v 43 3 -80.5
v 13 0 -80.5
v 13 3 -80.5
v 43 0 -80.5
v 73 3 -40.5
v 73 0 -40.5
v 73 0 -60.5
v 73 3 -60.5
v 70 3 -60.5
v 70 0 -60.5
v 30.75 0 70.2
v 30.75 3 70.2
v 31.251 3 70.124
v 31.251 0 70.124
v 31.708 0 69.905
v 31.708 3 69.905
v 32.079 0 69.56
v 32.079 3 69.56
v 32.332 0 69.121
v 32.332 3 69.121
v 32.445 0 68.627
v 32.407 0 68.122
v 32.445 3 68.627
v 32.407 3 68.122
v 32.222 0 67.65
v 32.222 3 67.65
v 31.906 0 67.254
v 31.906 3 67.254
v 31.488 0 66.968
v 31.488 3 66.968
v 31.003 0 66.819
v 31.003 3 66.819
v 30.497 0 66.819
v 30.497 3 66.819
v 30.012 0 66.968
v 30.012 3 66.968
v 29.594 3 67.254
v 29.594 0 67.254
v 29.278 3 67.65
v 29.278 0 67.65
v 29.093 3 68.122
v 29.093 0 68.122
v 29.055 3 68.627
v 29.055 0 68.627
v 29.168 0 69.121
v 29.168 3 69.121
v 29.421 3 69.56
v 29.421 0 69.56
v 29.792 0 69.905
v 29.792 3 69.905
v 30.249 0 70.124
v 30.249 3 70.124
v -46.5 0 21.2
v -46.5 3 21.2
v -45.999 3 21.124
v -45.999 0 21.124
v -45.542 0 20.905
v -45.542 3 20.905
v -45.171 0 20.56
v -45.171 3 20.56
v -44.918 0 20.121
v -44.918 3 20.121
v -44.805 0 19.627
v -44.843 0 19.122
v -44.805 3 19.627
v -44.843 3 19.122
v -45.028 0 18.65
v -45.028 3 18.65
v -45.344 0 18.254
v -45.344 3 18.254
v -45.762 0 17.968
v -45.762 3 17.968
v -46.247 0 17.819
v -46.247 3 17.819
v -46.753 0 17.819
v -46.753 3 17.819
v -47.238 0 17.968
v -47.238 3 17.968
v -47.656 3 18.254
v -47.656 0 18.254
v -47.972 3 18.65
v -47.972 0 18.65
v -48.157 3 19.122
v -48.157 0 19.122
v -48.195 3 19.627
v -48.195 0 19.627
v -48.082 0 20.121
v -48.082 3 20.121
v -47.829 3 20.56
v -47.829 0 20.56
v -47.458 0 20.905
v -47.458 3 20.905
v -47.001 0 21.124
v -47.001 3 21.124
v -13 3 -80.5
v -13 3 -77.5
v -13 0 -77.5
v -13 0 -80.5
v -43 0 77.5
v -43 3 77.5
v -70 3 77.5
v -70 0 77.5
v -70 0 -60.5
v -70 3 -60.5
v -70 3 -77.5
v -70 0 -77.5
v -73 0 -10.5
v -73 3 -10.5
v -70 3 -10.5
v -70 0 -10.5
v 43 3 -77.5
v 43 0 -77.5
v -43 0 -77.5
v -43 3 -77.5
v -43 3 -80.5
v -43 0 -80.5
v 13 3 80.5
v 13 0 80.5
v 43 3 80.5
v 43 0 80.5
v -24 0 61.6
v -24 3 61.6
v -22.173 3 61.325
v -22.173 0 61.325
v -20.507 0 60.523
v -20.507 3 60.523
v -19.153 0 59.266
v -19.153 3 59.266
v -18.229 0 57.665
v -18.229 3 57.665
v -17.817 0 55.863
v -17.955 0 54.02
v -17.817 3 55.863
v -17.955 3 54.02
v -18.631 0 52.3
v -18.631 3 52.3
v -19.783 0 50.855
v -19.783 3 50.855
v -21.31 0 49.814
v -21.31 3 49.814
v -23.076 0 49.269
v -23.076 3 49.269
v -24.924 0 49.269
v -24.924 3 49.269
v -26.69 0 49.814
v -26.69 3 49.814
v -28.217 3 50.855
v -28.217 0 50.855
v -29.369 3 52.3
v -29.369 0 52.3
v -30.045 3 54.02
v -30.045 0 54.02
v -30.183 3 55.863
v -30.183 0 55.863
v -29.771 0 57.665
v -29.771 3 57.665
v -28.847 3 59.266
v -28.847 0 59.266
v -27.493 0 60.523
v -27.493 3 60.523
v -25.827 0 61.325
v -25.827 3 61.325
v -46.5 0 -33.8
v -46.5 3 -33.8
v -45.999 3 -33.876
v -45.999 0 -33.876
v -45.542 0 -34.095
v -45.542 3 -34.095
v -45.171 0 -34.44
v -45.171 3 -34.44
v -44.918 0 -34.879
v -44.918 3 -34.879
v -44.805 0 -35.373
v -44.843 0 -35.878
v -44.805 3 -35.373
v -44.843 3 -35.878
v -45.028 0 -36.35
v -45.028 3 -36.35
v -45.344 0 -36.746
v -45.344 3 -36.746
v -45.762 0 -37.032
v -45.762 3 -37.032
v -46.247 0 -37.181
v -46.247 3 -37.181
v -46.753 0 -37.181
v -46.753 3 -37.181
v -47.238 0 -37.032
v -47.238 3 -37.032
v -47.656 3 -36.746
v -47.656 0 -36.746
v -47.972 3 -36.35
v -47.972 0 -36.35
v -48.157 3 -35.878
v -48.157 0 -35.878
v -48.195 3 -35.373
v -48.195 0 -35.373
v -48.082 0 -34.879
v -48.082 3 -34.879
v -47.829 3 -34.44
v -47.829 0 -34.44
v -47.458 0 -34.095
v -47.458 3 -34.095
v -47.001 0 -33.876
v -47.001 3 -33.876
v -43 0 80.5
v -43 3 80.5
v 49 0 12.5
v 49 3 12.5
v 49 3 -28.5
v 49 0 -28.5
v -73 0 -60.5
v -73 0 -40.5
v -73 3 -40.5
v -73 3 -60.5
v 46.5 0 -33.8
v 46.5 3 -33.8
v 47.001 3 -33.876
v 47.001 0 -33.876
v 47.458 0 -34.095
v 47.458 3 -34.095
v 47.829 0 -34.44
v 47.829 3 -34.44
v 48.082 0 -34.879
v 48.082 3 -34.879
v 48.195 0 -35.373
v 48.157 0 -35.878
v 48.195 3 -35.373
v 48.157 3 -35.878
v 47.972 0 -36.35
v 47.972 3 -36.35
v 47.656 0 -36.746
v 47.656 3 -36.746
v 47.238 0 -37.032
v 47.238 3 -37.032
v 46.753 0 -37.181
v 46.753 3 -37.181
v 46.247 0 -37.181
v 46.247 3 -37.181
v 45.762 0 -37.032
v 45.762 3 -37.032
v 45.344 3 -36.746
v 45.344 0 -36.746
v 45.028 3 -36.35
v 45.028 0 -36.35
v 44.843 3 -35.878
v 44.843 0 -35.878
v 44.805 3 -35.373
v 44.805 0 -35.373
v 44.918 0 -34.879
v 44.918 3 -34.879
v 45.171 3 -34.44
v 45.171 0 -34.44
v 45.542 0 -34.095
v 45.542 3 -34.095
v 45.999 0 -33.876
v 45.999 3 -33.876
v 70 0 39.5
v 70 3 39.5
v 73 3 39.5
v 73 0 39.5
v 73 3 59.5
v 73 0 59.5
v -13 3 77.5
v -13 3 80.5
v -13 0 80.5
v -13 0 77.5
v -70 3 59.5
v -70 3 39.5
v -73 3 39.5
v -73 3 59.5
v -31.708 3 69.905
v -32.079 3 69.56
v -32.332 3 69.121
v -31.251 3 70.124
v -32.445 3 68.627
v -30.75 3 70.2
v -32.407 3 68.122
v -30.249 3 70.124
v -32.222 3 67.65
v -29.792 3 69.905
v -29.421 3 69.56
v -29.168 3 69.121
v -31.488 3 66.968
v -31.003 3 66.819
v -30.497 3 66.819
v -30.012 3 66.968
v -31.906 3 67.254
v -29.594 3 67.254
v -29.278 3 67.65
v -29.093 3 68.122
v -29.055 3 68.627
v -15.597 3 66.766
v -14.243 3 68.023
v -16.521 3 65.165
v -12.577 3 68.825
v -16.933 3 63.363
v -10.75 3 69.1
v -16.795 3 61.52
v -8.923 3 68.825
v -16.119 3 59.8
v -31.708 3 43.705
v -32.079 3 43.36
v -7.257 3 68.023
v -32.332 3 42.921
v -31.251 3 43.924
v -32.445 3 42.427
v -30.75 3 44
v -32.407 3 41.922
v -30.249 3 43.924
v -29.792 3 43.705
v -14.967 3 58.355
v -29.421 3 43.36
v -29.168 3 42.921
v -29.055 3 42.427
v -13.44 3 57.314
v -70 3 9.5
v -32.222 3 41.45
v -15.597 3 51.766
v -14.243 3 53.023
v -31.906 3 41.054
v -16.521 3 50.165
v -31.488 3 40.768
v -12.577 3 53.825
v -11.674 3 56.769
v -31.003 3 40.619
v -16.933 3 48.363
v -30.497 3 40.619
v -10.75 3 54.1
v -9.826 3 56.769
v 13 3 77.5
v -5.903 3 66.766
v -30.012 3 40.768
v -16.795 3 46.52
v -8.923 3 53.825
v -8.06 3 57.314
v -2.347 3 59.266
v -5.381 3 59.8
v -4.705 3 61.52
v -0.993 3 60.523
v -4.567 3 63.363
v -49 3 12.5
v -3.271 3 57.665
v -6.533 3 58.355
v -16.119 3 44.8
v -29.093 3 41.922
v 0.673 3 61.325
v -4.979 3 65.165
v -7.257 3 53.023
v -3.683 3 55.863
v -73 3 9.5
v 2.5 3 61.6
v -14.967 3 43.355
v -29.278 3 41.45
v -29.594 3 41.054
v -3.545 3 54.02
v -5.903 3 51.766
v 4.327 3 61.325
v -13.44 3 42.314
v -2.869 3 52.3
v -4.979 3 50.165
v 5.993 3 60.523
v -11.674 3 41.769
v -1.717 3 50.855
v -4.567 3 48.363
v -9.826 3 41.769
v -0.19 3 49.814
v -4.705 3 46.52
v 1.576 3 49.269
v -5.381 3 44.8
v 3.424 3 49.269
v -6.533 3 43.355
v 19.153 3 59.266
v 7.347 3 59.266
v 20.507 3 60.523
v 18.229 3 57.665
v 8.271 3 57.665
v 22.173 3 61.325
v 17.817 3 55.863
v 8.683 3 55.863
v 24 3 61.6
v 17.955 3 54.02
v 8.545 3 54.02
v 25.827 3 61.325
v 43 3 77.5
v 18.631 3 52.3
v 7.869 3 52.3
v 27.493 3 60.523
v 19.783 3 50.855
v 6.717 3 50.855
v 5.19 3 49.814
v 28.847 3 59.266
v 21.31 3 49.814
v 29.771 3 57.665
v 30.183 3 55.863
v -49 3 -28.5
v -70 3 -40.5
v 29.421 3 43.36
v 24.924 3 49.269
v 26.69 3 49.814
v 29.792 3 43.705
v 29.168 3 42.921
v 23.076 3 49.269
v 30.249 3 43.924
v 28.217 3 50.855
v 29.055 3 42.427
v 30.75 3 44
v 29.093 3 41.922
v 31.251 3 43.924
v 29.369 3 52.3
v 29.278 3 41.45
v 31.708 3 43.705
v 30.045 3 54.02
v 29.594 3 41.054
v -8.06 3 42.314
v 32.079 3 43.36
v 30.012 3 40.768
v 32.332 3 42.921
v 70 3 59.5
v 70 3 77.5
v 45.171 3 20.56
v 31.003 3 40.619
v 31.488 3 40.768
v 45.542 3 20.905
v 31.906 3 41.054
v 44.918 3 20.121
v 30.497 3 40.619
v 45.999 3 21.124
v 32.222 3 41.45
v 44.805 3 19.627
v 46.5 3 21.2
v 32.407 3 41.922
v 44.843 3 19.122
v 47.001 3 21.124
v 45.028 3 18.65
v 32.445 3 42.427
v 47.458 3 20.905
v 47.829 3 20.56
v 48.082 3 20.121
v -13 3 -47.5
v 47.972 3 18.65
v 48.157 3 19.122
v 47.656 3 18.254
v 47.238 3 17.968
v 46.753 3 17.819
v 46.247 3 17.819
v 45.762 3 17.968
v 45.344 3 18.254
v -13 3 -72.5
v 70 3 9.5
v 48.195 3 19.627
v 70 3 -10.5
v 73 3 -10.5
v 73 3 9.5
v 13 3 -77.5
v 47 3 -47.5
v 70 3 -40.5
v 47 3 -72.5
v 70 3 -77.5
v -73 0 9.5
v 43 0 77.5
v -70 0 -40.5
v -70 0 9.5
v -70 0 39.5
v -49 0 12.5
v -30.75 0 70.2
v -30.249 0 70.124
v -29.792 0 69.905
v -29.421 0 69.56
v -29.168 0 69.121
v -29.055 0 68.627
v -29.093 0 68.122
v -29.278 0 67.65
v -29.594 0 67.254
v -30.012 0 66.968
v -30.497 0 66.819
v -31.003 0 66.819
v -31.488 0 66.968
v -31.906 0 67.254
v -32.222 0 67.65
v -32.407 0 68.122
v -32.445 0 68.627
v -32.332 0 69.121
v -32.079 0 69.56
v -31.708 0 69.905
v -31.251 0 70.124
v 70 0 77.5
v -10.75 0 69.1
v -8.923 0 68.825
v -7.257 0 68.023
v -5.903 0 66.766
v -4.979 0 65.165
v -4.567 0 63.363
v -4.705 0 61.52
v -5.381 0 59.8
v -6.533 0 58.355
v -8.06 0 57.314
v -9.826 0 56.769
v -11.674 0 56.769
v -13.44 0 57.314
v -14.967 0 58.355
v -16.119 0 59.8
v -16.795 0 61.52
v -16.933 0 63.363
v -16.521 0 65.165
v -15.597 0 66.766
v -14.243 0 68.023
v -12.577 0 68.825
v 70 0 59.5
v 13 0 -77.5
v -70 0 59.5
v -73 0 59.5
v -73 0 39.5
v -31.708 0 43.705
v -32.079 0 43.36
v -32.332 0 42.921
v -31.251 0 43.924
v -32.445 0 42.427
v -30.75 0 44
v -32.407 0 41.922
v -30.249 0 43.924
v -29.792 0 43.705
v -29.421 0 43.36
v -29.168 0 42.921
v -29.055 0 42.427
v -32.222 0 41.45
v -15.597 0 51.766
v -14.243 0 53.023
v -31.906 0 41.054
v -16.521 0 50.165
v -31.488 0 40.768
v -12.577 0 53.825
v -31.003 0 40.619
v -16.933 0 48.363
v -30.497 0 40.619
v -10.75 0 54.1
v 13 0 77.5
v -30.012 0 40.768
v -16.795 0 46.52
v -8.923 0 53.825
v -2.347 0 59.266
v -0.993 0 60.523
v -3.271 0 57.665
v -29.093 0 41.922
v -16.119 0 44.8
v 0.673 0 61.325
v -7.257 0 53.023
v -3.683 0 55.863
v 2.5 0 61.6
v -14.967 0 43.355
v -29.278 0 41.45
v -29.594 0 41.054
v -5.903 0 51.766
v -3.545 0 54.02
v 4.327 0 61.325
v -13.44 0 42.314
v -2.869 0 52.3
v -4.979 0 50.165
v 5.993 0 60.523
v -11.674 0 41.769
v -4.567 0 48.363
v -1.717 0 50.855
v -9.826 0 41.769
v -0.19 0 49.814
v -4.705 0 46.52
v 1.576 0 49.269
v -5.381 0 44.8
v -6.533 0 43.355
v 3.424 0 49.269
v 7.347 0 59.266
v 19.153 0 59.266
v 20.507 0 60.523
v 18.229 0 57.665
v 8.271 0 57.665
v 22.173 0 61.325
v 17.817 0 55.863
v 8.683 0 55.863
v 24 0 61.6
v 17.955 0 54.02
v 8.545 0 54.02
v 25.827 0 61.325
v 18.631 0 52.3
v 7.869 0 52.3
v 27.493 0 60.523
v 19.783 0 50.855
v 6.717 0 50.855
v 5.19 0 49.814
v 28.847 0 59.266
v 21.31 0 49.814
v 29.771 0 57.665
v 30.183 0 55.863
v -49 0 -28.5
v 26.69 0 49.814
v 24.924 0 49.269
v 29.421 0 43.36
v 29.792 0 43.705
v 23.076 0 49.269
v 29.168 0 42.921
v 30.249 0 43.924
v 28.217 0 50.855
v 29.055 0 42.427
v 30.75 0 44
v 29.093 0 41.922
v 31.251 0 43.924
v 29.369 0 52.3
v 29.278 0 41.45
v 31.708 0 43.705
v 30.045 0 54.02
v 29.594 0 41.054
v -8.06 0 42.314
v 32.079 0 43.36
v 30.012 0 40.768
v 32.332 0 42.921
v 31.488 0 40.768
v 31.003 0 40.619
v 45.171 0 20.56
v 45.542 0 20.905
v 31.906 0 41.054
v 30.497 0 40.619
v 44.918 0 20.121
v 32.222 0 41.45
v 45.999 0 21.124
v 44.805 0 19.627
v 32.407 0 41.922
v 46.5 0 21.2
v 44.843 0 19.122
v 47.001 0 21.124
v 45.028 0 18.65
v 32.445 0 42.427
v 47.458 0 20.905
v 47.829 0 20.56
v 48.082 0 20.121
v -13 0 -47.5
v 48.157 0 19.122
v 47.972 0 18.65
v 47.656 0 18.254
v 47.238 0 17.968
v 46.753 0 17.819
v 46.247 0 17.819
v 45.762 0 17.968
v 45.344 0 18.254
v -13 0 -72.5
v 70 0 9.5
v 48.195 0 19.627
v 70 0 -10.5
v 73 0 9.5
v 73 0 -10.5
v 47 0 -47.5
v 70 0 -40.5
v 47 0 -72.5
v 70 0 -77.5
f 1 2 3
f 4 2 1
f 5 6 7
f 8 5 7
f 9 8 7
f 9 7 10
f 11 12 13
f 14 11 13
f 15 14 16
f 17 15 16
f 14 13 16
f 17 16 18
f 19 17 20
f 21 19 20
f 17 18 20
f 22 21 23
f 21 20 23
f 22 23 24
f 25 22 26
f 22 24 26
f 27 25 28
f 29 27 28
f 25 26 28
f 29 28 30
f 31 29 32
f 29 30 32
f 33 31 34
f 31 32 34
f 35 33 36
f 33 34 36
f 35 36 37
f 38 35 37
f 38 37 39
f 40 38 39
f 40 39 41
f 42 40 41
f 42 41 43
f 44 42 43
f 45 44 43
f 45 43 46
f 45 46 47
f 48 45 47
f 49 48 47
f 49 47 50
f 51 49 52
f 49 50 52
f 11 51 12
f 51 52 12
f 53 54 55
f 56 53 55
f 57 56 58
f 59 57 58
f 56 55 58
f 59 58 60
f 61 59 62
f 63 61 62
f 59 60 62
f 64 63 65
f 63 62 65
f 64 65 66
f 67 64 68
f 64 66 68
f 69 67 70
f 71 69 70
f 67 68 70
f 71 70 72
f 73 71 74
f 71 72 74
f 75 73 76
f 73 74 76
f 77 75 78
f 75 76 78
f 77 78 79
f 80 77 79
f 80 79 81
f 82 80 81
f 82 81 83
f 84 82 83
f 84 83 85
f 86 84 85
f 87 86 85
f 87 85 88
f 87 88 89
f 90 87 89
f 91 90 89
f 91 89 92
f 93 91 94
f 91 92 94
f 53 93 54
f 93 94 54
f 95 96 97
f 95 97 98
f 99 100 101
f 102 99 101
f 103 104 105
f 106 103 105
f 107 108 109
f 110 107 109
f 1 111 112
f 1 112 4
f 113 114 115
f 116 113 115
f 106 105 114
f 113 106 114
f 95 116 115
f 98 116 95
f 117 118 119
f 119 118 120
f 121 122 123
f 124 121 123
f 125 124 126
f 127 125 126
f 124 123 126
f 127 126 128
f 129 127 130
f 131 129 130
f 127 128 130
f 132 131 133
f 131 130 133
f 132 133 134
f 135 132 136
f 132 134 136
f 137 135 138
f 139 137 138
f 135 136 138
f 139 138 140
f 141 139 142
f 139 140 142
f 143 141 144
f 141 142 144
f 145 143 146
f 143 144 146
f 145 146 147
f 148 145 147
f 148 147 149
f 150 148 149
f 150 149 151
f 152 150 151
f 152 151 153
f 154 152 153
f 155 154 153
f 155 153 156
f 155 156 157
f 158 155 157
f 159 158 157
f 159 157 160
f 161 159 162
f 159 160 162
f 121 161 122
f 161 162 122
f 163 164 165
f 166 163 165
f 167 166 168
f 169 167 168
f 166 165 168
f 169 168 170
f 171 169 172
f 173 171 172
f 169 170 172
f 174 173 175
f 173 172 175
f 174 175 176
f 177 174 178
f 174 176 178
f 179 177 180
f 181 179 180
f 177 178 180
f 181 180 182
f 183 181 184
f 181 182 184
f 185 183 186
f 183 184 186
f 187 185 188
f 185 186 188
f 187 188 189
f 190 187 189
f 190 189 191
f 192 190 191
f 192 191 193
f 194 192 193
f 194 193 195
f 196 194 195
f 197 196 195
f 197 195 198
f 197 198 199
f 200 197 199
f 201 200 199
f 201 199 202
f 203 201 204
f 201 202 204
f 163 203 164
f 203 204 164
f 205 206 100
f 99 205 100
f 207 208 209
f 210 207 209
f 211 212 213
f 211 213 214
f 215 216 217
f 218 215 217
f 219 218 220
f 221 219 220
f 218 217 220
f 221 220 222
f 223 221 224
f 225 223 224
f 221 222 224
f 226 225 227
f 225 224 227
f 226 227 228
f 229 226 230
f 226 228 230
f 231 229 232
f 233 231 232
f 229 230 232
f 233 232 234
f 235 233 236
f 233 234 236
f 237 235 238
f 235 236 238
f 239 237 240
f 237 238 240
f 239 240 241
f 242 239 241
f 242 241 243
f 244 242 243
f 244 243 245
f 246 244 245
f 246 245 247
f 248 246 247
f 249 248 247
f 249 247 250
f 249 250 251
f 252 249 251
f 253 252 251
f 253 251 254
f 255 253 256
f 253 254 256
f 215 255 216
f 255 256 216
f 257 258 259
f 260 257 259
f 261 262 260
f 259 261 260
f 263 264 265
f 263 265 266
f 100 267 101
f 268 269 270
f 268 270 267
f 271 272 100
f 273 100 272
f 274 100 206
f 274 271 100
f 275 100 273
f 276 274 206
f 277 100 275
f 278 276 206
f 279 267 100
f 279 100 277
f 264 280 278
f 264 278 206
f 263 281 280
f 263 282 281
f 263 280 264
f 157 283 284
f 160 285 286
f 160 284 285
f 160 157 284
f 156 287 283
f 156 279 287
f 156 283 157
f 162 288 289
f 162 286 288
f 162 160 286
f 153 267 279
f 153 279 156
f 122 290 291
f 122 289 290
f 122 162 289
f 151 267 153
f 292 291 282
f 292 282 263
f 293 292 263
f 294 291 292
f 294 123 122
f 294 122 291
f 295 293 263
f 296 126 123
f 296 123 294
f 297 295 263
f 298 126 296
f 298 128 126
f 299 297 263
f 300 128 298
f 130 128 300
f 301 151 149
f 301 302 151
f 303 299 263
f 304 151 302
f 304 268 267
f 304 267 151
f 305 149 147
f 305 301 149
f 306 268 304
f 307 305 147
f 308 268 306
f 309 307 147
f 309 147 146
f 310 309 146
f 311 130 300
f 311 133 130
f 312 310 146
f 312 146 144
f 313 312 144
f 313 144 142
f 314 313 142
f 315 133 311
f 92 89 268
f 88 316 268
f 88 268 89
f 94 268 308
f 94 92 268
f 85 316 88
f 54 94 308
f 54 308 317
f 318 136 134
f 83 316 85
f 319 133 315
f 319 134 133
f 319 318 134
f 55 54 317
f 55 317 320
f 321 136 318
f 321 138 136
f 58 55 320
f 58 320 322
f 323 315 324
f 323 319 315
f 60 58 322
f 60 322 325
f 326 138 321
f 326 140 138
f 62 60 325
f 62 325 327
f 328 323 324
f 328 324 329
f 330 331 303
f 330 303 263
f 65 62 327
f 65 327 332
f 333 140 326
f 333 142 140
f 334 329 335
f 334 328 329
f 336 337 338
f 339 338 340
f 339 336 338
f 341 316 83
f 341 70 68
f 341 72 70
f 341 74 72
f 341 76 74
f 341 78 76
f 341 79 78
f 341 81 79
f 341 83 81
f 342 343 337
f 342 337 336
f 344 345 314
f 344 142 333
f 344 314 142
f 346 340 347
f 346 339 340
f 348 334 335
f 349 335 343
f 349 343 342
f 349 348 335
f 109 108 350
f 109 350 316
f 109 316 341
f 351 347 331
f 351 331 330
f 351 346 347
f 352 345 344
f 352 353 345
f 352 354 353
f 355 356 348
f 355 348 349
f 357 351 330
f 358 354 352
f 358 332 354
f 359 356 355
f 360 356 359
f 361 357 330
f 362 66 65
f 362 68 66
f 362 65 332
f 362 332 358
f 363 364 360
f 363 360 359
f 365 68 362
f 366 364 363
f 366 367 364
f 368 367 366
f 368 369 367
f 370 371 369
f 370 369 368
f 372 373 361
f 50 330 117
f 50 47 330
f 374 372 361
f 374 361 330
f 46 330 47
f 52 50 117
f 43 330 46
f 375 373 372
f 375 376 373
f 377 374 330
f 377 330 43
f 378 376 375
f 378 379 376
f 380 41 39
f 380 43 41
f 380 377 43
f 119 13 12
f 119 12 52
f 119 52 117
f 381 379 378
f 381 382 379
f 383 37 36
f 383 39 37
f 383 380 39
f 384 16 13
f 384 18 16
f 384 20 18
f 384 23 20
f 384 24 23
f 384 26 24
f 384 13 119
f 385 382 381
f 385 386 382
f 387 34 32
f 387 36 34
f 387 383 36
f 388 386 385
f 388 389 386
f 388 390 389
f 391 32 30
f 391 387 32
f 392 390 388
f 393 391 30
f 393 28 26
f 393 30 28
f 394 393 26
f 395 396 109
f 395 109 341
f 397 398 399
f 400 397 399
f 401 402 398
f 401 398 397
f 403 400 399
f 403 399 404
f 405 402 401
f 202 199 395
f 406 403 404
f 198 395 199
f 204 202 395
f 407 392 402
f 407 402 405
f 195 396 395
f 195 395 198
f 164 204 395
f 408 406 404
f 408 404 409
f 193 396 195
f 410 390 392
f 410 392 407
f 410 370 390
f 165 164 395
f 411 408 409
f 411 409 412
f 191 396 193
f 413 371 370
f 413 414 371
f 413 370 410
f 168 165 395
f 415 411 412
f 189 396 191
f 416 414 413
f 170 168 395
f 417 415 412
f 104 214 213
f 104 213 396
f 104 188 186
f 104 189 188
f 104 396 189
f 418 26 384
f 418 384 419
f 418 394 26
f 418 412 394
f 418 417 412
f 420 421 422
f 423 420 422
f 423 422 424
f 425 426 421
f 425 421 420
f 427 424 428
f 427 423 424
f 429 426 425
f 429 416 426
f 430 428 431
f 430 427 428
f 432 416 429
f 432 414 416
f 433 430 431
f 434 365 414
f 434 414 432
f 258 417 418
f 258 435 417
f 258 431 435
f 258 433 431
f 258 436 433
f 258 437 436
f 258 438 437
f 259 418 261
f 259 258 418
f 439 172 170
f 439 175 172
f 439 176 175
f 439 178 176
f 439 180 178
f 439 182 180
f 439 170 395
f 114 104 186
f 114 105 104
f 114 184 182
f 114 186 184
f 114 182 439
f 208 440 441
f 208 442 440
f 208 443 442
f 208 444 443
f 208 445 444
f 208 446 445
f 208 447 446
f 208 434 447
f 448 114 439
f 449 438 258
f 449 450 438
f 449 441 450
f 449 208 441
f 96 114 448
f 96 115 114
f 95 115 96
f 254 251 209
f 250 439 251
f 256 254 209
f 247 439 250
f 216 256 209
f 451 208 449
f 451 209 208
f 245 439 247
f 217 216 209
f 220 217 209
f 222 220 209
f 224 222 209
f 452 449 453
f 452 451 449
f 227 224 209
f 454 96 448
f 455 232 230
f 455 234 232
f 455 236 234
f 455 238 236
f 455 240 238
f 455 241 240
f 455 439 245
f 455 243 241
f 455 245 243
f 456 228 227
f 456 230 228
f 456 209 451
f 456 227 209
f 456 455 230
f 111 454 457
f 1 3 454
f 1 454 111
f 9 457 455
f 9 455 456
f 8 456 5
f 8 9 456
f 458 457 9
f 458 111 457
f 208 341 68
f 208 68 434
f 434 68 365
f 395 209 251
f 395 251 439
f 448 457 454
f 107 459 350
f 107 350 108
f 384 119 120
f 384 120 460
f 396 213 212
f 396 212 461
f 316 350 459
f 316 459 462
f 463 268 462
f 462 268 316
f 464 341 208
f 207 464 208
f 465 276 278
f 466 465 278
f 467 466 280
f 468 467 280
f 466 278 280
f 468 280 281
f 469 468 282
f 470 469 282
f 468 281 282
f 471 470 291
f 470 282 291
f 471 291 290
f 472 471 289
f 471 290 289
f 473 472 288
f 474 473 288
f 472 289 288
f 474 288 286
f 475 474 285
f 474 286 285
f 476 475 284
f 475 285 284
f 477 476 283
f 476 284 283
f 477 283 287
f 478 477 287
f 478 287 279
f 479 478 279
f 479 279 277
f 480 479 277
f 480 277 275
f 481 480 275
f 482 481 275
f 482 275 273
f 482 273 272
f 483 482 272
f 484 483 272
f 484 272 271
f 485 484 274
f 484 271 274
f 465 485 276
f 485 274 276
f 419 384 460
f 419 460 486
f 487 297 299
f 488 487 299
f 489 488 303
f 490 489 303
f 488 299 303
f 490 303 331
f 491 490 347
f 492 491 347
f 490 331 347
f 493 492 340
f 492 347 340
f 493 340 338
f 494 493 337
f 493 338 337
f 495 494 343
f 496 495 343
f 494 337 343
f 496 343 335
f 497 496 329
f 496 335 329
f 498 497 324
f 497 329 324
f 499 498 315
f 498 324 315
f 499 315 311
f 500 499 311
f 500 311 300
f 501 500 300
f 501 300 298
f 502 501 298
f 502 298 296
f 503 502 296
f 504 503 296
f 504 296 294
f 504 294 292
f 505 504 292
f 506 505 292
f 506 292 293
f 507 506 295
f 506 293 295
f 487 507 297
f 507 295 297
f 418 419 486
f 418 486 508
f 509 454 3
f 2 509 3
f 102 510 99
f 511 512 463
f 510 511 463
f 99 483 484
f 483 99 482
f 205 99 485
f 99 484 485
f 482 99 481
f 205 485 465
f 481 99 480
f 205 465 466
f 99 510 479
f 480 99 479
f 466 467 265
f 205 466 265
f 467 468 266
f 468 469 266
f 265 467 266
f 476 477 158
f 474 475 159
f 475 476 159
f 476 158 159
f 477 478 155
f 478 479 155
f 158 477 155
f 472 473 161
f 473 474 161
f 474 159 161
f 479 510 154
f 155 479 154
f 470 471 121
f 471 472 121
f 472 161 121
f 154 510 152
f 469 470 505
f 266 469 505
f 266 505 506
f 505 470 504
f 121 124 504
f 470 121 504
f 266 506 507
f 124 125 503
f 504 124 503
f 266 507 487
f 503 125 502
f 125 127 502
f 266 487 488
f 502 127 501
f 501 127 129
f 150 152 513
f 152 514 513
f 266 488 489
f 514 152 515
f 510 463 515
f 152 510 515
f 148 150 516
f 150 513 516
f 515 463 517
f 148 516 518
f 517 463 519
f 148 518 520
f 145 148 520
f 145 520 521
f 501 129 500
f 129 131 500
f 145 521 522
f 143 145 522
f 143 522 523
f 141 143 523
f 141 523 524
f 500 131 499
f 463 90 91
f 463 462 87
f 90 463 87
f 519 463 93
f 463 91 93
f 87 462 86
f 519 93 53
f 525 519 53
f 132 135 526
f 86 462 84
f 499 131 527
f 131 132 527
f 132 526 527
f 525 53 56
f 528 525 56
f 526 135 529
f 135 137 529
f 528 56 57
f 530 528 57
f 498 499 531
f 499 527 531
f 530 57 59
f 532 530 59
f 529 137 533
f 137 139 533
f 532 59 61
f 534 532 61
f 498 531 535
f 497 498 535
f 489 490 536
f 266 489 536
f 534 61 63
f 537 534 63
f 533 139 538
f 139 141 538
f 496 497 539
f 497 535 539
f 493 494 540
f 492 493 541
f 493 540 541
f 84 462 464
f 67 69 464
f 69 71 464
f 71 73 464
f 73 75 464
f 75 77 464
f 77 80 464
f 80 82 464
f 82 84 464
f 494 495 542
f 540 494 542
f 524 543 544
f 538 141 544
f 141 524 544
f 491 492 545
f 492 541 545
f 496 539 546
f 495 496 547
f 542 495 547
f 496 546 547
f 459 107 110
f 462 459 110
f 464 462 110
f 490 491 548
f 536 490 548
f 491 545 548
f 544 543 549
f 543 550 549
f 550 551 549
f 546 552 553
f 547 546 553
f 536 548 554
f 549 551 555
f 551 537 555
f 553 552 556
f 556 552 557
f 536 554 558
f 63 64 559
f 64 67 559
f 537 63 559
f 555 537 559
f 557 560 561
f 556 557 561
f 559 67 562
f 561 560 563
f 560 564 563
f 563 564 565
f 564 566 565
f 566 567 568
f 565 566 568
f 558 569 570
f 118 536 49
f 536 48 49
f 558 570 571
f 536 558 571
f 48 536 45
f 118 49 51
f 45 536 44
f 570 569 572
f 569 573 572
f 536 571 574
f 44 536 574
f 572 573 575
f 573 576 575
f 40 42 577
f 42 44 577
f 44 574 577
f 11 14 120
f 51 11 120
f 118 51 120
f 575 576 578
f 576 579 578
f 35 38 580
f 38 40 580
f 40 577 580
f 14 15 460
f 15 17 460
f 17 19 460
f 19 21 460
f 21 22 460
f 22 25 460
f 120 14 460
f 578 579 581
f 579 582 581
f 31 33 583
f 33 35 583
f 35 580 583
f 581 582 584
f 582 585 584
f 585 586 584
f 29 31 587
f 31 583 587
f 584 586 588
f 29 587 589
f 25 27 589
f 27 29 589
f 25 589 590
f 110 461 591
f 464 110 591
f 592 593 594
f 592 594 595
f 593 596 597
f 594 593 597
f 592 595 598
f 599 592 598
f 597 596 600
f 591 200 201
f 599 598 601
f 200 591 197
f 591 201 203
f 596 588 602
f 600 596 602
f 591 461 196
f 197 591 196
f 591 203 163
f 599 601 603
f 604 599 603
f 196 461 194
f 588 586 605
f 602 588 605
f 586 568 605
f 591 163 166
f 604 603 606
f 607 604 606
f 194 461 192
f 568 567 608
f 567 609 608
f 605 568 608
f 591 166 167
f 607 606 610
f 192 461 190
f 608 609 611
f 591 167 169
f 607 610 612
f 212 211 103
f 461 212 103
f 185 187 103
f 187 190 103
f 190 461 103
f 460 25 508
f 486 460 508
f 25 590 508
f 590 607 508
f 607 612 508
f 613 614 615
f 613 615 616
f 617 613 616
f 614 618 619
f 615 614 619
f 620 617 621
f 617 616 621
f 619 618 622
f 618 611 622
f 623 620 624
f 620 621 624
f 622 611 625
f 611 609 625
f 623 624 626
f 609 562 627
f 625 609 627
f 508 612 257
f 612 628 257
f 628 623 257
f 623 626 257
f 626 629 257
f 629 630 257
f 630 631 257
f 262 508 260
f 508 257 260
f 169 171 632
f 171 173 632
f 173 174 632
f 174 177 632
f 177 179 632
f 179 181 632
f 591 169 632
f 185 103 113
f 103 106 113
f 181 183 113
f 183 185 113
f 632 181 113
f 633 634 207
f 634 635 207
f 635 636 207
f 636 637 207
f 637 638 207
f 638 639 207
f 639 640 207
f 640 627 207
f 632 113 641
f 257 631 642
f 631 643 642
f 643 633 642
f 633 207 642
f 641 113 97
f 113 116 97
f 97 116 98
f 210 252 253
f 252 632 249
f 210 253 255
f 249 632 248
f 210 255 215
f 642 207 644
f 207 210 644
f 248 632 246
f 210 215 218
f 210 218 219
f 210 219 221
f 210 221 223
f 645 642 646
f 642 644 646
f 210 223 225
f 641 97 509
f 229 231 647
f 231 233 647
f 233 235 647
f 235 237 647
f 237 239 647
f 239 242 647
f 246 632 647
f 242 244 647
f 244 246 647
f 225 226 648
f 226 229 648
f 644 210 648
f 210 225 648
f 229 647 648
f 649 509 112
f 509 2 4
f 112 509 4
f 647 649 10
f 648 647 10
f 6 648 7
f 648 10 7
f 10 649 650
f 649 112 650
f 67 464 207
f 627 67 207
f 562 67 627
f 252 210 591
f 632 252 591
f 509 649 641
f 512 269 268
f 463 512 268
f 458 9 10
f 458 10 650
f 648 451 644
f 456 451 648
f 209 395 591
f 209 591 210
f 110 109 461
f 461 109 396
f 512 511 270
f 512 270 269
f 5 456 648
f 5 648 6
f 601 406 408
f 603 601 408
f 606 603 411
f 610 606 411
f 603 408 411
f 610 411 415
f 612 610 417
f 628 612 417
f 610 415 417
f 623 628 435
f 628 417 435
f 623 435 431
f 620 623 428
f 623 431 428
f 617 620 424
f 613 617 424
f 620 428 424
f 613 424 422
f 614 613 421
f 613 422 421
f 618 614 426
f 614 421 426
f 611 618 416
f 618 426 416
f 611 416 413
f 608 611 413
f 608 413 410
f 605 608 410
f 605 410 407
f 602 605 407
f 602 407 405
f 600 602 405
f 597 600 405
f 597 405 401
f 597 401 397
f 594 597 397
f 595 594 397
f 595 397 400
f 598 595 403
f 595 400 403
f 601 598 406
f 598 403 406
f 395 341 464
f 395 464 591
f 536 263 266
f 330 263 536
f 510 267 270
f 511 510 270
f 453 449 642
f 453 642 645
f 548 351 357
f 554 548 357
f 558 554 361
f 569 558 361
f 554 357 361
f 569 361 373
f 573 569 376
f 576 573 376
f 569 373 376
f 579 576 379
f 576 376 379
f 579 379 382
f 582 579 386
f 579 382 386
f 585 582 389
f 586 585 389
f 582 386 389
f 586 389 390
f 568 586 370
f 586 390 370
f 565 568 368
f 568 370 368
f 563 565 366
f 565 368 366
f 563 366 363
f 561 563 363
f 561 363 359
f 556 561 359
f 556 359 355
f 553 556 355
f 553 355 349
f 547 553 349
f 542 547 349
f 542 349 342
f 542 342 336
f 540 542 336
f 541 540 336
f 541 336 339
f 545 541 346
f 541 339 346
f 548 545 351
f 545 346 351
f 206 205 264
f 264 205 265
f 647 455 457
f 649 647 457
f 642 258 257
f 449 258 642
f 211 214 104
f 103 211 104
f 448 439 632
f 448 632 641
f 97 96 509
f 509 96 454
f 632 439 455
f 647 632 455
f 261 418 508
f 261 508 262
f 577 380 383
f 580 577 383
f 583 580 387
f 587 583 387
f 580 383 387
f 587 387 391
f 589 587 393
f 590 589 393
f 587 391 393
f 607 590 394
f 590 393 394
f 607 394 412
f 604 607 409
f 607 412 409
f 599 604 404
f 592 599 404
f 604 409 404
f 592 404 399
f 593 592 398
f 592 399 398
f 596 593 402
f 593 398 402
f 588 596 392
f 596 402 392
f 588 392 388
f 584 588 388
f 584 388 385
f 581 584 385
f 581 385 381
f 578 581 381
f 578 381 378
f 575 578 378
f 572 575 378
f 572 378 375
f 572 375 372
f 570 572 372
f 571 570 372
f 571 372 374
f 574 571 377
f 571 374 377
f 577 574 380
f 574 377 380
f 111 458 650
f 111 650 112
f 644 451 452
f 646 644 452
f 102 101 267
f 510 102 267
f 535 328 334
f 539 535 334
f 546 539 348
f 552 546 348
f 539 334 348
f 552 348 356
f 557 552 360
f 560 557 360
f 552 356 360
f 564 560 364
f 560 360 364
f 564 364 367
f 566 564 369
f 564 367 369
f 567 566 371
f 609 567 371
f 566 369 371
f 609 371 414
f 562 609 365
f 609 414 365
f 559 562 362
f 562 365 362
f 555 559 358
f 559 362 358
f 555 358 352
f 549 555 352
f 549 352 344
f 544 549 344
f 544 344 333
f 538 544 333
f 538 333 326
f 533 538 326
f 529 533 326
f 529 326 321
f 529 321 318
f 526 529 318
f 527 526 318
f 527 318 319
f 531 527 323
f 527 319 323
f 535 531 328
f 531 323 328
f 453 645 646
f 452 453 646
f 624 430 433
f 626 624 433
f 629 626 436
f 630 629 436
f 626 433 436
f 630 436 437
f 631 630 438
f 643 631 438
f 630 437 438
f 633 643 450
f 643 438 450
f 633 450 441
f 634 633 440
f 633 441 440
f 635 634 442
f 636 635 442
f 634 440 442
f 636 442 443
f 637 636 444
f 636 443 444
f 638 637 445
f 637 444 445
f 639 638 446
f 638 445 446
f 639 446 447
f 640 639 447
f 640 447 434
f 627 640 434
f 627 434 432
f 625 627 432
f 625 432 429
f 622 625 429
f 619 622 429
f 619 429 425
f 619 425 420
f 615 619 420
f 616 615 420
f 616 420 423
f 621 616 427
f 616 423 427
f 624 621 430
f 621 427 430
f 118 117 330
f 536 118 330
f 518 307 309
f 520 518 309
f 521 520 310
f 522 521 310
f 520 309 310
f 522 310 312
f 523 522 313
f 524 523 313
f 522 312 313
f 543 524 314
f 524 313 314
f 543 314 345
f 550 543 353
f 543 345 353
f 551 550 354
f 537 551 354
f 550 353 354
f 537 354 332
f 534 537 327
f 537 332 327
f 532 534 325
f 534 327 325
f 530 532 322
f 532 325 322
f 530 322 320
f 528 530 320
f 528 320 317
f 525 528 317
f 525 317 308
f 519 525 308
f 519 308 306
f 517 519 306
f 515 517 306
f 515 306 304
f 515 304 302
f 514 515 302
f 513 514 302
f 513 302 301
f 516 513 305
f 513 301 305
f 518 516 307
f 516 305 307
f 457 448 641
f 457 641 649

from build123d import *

# Parameters (mm, degrees)
SKETCH1_W           = 146
SKETCH1_H           = 161
BOSS_EXTRUDE1_DEPTH = 3
SKETCH2_W           = 26
SKETCH2_H           = 3
SKETCH2_W_2         = 3
SKETCH2_H_2         = 30
SKETCH2_W_3         = 60
SKETCH2_H_3         = 25
CUT_EXTRUDE1_DEPTH  = 3
SKETCH4_R           = 1.7
SKETCH4_R_2         = 6.2
SKETCH4_W           = 98
SKETCH4_H           = 41
CUT_EXTRUDE2_DEPTH  = 3


with BuildPart() as part:
    # Sketch1 → Boss-Extrude1 (new body)
    with BuildSketch(Plane(origin=(0, 0, 0), x_dir=(1, 0, 0), z_dir=(0, 1, 0))):
        Rectangle(SKETCH1_W, SKETCH1_H)
    extrude(amount=BOSS_EXTRUDE1_DEPTH)

    # Sketch2 → Cut-Extrude1 (cut)
    with BuildSketch(Plane(origin=(0, 3, 0), x_dir=(1, 0, 0), z_dir=(0, 1, 0))):
        with Locations((0, 79)):
            Rectangle(SKETCH2_W, SKETCH2_H)
        with Locations((-71.5, 25.5)):
            Rectangle(SKETCH2_W_2, SKETCH2_H_2)
        Polygon((-73, 80.5), (-73, 60.5), (-70, 60.5), (-70, 77.5), (-43, 77.5), (-43, 80.5), align=None)
        Polygon((73, 80.5), (73, 60.5), (70, 60.5), (70, 77.5), (43, 77.5), (43, 80.5), align=None)
        with Locations((71.5, 25.5)):
            Rectangle(SKETCH2_W_2, SKETCH2_H_2)
        with Locations((-71.5, -24.5)):
            Rectangle(SKETCH2_W_2, SKETCH2_H_2)
        Polygon((-70, -59.5), (-73, -59.5), (-73, -80.5), (-43, -80.5), (-43, -77.5), (-70, -77.5), align=None)
        with Locations((71.5, -24.5)):
            Rectangle(SKETCH2_W_2, SKETCH2_H_2)
        Polygon((70, -59.5), (73, -59.5), (73, -80.5), (70, -80.5), (43, -80.5), (43, -77.5), (70, -77.5), align=None)
        with Locations((0, -79)):
            Rectangle(SKETCH2_W, SKETCH2_H)
        with Locations((17, 60)):
            Rectangle(SKETCH2_W_3, SKETCH2_H_3)
    extrude(amount=-CUT_EXTRUDE1_DEPTH, mode=Mode.SUBTRACT)

    # Sketch4 → Cut-Extrude2 (cut)
    with BuildSketch(Plane(origin=(0, 3, 0), x_dir=(1, 0, 0), z_dir=(0, 1, 0))):
        with Locations(Location((-46.5, 35.5, 0), (0, 0, 270))):
            Circle(SKETCH4_R)
        with Locations(Location((46.5, 35.5, 0), (0, 0, 270))):
            Circle(SKETCH4_R)
        with Locations(Location((46.5, -19.5, 0), (0, 0, 270))):
            Circle(SKETCH4_R)
        with Locations(Location((-46.5, -19.5, 0), (0, 0, 270))):
            Circle(SKETCH4_R)
        with Locations(Location((-30.75, -42.3, 0), (0, 0, 270))):
            Circle(SKETCH4_R)
        with Locations(Location((-30.75, -68.5, 0), (0, 0, 270))):
            Circle(SKETCH4_R)
        with Locations(Location((30.75, -42.3, 0), (0, 0, 270))):
            Circle(SKETCH4_R)
        with Locations(Location((30.75, -68.5, 0), (0, 0, 270))):
            Circle(SKETCH4_R)
        with Locations(Location((-10.75, -47.9, 0), (0, 0, 270))):
            Circle(SKETCH4_R_2)
        with Locations(Location((-24, -55.4, 0), (0, 0, 270))):
            Circle(SKETCH4_R_2)
        with Locations(Location((-10.75, -62.9, 0), (0, 0, 270))):
            Circle(SKETCH4_R_2)
        with Locations(Location((2.5, -55.4, 0), (0, 0, 270))):
            Circle(SKETCH4_R_2)
        with Locations(Location((24, -55.4, 0), (0, 0, 270))):
            Circle(SKETCH4_R_2)
        with Locations((0, 8)):
            Rectangle(SKETCH4_W, SKETCH4_H)
    extrude(amount=-CUT_EXTRUDE2_DEPTH, mode=Mode.SUBTRACT)


solid = part.part
